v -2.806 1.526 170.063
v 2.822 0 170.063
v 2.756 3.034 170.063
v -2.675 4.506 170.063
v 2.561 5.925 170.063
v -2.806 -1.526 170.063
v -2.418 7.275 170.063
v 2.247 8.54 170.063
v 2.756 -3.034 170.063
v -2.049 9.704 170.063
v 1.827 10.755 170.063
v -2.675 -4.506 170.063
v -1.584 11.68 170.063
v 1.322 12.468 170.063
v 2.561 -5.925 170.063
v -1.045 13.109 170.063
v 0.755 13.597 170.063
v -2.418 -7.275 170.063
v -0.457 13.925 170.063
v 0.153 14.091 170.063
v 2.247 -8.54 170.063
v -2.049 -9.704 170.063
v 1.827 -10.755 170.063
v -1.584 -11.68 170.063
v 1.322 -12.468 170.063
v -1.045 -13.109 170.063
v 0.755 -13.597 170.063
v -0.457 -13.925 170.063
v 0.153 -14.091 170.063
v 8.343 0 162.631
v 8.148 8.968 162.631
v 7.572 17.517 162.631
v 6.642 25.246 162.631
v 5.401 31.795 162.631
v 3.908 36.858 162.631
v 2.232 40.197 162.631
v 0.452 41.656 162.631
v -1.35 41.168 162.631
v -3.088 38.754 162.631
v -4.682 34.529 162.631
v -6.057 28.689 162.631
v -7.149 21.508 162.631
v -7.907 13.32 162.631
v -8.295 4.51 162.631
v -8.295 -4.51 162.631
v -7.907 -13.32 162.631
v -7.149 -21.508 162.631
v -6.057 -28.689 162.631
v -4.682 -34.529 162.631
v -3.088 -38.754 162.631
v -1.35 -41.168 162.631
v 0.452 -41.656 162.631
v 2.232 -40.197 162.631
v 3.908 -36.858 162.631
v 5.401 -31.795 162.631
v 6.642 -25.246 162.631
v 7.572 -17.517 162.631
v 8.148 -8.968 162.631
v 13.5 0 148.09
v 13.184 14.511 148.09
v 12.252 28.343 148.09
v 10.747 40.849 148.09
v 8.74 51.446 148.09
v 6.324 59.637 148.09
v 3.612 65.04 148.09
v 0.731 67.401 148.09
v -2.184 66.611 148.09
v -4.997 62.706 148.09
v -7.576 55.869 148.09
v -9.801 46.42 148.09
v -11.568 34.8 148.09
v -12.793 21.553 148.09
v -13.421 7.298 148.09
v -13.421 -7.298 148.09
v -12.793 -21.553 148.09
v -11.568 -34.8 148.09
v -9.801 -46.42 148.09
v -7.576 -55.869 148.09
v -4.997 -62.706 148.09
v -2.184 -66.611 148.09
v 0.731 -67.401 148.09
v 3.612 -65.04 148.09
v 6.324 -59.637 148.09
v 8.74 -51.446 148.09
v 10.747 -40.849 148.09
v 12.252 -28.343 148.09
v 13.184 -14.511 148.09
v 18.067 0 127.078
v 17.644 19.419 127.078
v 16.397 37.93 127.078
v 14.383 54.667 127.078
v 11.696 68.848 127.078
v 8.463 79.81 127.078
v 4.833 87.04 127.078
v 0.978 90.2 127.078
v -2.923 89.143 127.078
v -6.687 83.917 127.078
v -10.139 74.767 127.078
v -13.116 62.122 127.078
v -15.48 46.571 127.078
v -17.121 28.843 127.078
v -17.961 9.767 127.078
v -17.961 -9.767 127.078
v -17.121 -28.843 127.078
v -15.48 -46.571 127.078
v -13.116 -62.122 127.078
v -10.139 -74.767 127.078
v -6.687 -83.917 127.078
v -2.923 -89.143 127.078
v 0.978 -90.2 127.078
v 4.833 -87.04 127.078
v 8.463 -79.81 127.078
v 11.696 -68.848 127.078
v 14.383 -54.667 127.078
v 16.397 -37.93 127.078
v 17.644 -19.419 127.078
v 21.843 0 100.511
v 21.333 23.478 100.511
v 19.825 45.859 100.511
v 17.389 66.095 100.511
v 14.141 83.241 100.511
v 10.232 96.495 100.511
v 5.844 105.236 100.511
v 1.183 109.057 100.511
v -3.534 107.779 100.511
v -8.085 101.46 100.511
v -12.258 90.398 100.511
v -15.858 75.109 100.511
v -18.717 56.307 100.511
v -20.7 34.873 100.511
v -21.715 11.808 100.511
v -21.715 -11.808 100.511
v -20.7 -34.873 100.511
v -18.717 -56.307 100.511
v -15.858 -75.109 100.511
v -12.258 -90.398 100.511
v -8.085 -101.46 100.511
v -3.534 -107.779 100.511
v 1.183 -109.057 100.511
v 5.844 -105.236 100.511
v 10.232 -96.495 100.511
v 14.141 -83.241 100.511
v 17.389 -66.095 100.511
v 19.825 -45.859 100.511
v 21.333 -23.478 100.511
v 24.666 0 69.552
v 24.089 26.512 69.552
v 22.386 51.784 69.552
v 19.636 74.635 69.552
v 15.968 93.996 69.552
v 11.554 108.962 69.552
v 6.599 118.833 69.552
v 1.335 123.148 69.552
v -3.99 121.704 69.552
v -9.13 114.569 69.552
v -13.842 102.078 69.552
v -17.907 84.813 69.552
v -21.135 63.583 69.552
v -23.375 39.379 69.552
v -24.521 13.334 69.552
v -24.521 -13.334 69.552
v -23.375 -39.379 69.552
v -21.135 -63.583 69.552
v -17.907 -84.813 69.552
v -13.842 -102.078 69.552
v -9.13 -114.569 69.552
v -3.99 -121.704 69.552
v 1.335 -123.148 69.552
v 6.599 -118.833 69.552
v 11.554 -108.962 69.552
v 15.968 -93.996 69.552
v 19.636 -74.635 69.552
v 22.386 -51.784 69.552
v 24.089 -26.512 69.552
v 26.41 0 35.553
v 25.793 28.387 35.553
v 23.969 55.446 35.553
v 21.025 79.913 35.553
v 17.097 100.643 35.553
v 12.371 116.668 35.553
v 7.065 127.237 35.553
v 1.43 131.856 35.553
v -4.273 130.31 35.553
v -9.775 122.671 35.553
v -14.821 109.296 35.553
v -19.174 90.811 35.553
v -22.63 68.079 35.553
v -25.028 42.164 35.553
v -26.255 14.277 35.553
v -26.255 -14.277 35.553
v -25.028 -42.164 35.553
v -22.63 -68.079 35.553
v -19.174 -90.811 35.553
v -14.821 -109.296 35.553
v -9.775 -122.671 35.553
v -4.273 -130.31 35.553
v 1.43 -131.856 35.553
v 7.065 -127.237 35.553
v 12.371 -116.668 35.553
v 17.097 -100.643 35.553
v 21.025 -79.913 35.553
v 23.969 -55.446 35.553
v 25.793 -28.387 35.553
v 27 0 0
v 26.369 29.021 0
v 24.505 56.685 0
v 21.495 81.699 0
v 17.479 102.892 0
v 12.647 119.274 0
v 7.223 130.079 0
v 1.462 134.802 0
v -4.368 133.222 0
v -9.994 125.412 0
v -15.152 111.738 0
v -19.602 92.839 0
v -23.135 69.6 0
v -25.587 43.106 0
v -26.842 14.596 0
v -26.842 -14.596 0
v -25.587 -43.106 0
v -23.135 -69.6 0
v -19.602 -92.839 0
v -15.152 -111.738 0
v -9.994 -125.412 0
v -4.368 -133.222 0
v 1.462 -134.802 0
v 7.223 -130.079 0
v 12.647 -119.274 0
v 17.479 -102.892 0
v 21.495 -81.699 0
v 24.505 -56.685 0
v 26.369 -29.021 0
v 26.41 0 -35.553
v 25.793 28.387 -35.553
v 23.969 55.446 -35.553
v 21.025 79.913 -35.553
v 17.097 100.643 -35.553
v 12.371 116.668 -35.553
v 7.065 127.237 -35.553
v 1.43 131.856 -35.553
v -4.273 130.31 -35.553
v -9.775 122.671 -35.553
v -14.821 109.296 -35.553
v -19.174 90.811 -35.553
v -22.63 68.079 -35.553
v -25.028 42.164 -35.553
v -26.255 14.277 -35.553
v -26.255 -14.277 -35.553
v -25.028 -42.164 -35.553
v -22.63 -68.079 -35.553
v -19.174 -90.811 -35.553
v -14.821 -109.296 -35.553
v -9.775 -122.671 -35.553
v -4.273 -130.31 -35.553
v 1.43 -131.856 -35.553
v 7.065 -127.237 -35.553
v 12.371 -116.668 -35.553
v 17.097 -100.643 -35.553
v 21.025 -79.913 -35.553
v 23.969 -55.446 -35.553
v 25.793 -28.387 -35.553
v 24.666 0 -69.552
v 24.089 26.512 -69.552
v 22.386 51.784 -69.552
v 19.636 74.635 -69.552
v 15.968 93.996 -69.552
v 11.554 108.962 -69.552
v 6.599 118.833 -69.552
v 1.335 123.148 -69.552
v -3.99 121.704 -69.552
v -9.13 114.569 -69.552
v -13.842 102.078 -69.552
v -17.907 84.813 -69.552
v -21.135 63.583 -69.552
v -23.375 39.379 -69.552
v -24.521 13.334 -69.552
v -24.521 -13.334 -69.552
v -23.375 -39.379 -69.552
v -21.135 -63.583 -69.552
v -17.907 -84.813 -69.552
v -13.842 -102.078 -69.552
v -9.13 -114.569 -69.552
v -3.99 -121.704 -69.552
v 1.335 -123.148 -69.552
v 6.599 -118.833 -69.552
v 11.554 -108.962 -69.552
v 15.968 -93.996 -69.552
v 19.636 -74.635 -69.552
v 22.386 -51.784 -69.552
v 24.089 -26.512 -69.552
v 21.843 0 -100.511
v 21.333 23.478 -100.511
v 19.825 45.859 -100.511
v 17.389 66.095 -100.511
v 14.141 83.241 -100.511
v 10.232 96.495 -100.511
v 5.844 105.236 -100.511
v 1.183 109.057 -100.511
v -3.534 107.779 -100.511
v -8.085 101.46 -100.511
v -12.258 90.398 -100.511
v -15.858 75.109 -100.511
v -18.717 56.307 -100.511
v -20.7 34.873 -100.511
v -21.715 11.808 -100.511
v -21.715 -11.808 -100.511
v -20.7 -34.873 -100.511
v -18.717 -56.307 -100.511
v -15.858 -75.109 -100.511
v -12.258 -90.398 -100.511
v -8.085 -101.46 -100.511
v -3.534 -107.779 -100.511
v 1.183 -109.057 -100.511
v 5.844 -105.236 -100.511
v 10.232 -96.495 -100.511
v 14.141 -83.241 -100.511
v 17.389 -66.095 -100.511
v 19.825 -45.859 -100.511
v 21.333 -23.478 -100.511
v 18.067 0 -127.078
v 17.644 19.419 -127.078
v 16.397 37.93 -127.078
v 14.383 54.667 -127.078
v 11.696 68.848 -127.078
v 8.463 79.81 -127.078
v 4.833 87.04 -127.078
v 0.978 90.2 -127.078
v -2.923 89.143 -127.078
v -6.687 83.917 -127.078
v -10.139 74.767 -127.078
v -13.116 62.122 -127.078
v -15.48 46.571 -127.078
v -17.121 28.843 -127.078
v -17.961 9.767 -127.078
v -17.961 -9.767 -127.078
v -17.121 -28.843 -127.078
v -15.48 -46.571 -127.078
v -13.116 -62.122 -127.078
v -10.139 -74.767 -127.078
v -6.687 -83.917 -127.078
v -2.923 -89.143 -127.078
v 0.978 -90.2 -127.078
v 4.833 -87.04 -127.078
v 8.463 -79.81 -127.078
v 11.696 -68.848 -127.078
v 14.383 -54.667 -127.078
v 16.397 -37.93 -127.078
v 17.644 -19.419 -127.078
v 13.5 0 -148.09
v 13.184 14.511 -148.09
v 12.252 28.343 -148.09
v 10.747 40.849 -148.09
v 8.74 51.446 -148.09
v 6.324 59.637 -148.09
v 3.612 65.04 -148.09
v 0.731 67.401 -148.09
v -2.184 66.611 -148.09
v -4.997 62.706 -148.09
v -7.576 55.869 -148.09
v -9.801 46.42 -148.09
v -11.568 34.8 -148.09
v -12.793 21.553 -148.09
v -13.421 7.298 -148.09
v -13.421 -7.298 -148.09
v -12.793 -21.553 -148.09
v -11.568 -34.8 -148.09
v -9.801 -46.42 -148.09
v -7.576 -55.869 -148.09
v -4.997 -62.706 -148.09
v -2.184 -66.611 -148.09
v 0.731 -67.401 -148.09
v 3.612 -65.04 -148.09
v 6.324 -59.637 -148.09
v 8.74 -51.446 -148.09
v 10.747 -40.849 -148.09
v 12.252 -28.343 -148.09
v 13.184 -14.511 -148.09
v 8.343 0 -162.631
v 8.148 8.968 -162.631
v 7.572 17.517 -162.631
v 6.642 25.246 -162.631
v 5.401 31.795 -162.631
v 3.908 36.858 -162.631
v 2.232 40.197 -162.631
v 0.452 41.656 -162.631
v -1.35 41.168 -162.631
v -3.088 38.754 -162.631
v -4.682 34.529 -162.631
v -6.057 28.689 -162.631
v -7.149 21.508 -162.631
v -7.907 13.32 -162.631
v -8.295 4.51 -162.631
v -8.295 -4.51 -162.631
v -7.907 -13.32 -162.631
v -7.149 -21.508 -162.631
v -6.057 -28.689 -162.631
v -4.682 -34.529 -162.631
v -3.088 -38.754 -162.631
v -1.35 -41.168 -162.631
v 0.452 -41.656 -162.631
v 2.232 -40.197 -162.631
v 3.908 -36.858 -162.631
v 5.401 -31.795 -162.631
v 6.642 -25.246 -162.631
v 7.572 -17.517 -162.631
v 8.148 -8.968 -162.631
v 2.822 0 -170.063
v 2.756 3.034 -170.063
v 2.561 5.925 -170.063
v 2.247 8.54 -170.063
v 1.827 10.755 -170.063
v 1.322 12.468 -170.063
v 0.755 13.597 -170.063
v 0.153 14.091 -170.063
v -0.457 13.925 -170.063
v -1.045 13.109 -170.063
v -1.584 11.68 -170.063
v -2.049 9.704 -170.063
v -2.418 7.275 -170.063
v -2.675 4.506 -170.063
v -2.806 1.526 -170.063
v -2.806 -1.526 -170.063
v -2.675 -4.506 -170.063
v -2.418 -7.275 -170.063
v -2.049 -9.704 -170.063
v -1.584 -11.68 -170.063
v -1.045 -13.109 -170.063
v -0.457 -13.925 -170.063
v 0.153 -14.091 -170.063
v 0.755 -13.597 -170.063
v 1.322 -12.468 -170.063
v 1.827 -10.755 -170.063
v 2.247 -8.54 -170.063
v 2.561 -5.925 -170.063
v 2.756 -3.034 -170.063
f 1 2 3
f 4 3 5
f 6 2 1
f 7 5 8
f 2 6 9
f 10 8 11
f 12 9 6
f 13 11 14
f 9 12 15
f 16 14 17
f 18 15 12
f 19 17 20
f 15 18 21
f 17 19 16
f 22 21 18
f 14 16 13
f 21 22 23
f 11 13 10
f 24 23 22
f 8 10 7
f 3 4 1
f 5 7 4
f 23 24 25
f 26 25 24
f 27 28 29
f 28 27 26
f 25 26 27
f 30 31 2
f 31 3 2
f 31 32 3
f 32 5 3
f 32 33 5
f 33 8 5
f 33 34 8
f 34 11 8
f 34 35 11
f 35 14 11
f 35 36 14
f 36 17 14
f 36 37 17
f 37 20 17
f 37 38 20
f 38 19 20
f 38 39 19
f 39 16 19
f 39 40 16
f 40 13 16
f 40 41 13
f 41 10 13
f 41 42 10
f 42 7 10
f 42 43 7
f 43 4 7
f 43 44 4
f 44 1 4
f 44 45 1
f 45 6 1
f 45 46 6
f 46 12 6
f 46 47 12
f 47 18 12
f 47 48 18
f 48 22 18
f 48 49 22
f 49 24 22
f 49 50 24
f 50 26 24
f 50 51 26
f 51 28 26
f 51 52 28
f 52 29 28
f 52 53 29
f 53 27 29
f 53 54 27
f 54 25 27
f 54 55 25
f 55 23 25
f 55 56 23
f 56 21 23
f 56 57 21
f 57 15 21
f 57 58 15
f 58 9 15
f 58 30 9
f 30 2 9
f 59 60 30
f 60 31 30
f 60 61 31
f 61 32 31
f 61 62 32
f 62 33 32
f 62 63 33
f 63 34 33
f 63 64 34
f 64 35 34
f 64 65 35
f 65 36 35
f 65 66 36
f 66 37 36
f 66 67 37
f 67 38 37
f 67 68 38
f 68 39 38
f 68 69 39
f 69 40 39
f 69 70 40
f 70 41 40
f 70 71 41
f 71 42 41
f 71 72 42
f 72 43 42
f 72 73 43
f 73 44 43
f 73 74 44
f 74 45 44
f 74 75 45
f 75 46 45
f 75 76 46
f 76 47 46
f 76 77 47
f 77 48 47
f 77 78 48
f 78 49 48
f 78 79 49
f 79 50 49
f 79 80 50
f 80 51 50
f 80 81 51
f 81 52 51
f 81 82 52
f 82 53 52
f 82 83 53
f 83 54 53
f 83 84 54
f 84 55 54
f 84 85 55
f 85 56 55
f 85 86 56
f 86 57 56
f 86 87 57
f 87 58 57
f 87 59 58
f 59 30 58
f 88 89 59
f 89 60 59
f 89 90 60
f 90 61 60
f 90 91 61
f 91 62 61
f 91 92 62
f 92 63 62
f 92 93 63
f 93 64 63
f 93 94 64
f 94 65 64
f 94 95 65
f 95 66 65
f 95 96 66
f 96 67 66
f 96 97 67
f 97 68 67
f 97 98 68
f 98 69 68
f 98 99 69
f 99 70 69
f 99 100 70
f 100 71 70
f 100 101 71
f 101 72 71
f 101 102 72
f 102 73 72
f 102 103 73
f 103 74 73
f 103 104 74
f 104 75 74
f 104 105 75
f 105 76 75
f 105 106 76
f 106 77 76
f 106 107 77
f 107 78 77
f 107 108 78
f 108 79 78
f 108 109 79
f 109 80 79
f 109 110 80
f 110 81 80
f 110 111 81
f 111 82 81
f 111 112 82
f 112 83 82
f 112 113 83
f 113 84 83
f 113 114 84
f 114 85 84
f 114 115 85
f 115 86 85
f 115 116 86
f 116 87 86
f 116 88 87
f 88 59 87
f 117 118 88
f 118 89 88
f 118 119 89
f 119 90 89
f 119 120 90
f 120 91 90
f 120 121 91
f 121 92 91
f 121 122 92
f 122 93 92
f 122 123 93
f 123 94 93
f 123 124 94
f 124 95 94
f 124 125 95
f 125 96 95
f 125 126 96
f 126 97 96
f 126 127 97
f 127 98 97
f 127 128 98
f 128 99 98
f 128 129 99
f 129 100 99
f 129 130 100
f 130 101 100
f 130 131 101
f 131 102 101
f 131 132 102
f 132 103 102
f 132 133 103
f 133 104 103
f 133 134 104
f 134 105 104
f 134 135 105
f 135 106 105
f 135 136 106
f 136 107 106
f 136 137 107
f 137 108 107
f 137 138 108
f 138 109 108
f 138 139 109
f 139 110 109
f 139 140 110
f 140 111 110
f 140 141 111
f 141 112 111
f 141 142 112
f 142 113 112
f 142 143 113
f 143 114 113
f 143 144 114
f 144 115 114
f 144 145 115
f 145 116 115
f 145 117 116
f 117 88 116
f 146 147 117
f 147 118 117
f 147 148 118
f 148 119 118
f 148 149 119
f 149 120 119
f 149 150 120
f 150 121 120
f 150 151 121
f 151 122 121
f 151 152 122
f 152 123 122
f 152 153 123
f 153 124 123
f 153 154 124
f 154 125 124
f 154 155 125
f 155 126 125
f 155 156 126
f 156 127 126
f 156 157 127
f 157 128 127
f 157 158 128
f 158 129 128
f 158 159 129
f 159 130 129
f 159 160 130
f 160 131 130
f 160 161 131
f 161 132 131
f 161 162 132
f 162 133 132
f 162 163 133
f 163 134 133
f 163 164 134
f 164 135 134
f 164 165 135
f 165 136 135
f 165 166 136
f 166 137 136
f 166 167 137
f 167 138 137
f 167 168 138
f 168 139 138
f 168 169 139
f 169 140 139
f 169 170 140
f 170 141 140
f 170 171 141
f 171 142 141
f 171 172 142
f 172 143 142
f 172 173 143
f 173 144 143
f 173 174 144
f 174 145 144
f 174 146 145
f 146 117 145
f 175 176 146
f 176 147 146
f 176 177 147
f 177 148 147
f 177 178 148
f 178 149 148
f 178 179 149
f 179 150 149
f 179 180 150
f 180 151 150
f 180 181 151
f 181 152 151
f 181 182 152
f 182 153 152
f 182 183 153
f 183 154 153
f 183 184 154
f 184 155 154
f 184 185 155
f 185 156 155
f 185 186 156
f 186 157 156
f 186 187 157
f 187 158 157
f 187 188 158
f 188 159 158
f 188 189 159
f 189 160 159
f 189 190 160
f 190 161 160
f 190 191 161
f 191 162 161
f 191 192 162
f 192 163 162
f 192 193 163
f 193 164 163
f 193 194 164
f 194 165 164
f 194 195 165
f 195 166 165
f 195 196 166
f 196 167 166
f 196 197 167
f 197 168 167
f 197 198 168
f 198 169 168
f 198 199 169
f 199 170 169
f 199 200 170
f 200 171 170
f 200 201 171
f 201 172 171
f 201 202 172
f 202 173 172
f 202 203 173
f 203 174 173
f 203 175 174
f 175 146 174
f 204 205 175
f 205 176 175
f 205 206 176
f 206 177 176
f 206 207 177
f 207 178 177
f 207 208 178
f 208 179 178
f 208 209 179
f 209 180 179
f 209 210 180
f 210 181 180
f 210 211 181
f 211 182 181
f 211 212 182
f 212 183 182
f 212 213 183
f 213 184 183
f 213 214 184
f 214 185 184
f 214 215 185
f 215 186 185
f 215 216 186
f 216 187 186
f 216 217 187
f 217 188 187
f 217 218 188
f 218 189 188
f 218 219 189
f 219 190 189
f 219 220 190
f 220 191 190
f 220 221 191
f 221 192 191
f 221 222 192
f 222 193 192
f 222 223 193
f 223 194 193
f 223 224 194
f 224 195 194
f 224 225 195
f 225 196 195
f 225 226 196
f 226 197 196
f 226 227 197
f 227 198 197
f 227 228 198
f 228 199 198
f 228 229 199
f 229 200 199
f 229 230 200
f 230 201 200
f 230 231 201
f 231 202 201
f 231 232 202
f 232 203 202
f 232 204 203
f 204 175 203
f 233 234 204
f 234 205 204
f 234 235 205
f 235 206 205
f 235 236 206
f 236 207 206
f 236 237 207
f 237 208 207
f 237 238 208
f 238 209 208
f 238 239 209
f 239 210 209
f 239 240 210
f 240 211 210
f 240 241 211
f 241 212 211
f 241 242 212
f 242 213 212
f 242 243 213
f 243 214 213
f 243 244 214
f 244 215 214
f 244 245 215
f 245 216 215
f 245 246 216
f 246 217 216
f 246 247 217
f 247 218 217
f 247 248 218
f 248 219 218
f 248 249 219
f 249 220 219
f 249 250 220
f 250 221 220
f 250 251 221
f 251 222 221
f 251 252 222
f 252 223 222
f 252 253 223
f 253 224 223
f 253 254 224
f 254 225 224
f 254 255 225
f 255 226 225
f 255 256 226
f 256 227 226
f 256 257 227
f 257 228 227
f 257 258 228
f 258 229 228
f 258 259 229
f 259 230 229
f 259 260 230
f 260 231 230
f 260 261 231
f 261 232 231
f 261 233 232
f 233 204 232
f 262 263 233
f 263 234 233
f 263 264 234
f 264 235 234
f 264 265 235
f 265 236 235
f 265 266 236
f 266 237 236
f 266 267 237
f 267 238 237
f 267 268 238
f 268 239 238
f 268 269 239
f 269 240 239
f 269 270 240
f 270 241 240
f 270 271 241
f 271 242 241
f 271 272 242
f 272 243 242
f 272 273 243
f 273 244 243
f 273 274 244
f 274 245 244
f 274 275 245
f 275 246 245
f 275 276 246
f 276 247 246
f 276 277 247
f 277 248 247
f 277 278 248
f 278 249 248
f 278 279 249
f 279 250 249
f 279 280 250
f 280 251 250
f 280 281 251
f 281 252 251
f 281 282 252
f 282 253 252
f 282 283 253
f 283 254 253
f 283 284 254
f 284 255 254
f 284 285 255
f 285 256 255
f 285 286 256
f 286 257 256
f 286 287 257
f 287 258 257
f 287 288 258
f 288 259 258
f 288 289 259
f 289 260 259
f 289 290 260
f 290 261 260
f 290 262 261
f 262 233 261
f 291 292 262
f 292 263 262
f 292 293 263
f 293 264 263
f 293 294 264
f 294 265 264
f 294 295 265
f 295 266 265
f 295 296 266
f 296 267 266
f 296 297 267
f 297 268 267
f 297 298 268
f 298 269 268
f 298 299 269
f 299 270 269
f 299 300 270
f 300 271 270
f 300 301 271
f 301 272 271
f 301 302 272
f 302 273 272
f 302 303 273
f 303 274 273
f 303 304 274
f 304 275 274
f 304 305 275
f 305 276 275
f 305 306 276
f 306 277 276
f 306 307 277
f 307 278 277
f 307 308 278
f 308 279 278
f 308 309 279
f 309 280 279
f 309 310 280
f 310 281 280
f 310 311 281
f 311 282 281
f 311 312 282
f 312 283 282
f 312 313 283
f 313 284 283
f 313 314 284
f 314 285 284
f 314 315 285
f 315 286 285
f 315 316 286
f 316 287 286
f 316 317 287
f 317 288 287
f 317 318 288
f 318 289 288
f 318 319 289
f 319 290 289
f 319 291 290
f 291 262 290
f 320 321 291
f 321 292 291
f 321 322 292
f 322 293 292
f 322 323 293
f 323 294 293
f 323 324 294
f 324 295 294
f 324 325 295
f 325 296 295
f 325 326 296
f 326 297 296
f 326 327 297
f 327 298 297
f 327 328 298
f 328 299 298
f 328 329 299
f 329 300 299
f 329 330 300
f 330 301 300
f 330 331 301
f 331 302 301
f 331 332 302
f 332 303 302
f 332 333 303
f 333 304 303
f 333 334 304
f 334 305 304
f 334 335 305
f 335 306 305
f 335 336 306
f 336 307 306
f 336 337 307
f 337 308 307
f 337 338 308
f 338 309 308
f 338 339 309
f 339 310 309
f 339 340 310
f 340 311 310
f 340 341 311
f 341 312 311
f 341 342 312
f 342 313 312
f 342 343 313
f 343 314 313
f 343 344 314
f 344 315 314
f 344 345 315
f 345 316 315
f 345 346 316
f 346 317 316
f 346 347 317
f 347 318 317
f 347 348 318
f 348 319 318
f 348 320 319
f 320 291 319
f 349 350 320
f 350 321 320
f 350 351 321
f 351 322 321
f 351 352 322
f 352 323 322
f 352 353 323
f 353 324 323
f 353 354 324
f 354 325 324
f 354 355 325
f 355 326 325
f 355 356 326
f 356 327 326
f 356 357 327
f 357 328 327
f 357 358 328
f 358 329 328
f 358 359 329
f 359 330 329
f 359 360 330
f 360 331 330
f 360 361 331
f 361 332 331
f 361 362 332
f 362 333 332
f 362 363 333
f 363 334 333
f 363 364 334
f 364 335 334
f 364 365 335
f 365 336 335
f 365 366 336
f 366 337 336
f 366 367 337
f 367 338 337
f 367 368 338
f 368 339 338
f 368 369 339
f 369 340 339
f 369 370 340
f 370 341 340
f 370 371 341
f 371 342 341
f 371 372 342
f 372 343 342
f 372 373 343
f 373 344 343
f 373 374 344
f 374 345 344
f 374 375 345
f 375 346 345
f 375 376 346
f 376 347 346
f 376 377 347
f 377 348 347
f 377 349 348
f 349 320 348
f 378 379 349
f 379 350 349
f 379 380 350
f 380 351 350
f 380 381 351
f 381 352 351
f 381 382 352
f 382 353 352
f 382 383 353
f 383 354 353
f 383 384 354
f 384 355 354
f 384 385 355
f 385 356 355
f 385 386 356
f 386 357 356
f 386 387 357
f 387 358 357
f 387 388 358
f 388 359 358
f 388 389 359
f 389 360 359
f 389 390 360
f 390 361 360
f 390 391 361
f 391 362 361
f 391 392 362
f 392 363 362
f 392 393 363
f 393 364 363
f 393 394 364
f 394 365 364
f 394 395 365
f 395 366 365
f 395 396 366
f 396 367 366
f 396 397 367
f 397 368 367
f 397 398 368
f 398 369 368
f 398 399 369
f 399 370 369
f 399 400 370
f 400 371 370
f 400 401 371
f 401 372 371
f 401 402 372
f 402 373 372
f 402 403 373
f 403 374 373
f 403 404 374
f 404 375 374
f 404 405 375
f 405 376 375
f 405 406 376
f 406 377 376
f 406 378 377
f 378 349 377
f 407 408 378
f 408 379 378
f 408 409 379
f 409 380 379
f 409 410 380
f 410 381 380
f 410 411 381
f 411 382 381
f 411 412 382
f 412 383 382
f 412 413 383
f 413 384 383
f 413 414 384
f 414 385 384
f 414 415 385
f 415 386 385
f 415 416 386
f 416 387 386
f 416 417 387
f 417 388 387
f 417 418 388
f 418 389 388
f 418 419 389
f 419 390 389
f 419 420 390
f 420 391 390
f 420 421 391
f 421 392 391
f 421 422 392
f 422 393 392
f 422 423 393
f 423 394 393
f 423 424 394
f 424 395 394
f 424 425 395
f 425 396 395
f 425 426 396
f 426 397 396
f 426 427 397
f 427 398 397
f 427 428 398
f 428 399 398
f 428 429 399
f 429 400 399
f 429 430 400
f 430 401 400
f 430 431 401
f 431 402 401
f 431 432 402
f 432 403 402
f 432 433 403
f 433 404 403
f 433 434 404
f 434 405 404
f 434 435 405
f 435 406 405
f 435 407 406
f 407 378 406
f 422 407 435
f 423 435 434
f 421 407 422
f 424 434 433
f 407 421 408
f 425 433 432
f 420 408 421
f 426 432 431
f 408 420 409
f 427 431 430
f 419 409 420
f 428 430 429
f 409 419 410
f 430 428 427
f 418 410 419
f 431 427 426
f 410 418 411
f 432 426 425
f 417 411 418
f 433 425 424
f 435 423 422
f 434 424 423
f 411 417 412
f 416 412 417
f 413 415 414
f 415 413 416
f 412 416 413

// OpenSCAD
// Generated by SolidPython 1.0.1 on 2020-07-29 00:46:45


scale(v = [3, 15, 19]) {
	sphere(r = 9);
}
/***********************************************
*********      SolidPython code:      **********
************************************************
 
# import packages: SolidPython
from solid import *
from solid.utils import *
from itertools import chain, combinations, permutations


class Resize:

    def __init__(self, scad_file):
        self.scad_file = scad_file
        #self.scad_file = import_scad(scad_file)
        # cone/cylinder param:
        self.r1 = 0
        self.r2 = 0
        self.h = 0
        # rectangular prism param:
        self.w = 0
        self.l = 0
        # ellipse param:
        self.r = 0

    # import OpenScad code (file name corresponds to shape)


    # classify shape + parameters
    def assign(self, param1, param2, param3):
        if self.scad_file == 'cone.scad':
            self.r1 = param1
            self.r2 = param2
            self.h = param3
        elif self.scad_file == 'cylinder.scad':
            self.r1 = param1
            self.r2 = param2
            self.h = param3
        elif self.scad_file == 'rectangularPrism.scad':
            self.h = param1
            self.l = param2
            self.w = param3
        else:
            self.r = param1
            self.h = param2

    # resize parameters
    def iterate(self):
        x = range(3, 20, 2)
        i = 1
        if self.scad_file == 'cone.scad':
            tempList = list(permutations(x, 2))
            for temp in tempList:
                param1 = temp[0]
                param2 = temp[1]
                filepath = 'produced_scad_files/' + 'cone' + str(param1) + '_' + str(param2) + '_' + '.scad'
                scad_render_to_file(cylinder(h=param1, r1=param2, r2=0), filepath)

        elif self.scad_file == 'cylinder.scad':
            tempList = list(permutations(x, 3))
            for temp in tempList:
                param1 = temp[0]
                param2 = temp[1]
                filepath = 'produced_scad_files/' + 'cylinder' + str(param1) + '_' + str(param2) + '_' + '.scad'
                scad_render_to_file(cylinder(h=param1, r1=param2, r2=param2), filepath)

        elif self.scad_file == 'rectangularPrism.scad':
            tempList = list(permutations(x, 3))
            for temp in tempList:
                param1 = temp[0]
                param2 = temp[1]
                param3 = temp[2]
                filepath = 'produced_scad_files/' + 'rectangularPrism' + str(param1) + '_' + str(param2) + '_' + str(
                    param3) + '.scad'
                scad_render_to_file(cube(size=(param1, param2, param3)), filepath)

        elif self.scad_file == 'ellipse.scad':
            tempList = list(permutations(x, 4))
            for temp in tempList:
                param1 = temp[0]
                param2 = temp[1]
                param3 = temp[2]
                param4 = temp[3]
                filepath = 'produced_scad_files/' + 'ellipse' + str(param1) + '_' + str(param2) + '_' + str(param3) + '_' + str(param4) + '.scad'
                scad_render_to_file(scale([param1, param2, param3])(sphere(r=param4)), filepath)

    def render_to_scadfile(self):
        scad_render_to_file(scad, 'example.scad') 
 
************************************************/
